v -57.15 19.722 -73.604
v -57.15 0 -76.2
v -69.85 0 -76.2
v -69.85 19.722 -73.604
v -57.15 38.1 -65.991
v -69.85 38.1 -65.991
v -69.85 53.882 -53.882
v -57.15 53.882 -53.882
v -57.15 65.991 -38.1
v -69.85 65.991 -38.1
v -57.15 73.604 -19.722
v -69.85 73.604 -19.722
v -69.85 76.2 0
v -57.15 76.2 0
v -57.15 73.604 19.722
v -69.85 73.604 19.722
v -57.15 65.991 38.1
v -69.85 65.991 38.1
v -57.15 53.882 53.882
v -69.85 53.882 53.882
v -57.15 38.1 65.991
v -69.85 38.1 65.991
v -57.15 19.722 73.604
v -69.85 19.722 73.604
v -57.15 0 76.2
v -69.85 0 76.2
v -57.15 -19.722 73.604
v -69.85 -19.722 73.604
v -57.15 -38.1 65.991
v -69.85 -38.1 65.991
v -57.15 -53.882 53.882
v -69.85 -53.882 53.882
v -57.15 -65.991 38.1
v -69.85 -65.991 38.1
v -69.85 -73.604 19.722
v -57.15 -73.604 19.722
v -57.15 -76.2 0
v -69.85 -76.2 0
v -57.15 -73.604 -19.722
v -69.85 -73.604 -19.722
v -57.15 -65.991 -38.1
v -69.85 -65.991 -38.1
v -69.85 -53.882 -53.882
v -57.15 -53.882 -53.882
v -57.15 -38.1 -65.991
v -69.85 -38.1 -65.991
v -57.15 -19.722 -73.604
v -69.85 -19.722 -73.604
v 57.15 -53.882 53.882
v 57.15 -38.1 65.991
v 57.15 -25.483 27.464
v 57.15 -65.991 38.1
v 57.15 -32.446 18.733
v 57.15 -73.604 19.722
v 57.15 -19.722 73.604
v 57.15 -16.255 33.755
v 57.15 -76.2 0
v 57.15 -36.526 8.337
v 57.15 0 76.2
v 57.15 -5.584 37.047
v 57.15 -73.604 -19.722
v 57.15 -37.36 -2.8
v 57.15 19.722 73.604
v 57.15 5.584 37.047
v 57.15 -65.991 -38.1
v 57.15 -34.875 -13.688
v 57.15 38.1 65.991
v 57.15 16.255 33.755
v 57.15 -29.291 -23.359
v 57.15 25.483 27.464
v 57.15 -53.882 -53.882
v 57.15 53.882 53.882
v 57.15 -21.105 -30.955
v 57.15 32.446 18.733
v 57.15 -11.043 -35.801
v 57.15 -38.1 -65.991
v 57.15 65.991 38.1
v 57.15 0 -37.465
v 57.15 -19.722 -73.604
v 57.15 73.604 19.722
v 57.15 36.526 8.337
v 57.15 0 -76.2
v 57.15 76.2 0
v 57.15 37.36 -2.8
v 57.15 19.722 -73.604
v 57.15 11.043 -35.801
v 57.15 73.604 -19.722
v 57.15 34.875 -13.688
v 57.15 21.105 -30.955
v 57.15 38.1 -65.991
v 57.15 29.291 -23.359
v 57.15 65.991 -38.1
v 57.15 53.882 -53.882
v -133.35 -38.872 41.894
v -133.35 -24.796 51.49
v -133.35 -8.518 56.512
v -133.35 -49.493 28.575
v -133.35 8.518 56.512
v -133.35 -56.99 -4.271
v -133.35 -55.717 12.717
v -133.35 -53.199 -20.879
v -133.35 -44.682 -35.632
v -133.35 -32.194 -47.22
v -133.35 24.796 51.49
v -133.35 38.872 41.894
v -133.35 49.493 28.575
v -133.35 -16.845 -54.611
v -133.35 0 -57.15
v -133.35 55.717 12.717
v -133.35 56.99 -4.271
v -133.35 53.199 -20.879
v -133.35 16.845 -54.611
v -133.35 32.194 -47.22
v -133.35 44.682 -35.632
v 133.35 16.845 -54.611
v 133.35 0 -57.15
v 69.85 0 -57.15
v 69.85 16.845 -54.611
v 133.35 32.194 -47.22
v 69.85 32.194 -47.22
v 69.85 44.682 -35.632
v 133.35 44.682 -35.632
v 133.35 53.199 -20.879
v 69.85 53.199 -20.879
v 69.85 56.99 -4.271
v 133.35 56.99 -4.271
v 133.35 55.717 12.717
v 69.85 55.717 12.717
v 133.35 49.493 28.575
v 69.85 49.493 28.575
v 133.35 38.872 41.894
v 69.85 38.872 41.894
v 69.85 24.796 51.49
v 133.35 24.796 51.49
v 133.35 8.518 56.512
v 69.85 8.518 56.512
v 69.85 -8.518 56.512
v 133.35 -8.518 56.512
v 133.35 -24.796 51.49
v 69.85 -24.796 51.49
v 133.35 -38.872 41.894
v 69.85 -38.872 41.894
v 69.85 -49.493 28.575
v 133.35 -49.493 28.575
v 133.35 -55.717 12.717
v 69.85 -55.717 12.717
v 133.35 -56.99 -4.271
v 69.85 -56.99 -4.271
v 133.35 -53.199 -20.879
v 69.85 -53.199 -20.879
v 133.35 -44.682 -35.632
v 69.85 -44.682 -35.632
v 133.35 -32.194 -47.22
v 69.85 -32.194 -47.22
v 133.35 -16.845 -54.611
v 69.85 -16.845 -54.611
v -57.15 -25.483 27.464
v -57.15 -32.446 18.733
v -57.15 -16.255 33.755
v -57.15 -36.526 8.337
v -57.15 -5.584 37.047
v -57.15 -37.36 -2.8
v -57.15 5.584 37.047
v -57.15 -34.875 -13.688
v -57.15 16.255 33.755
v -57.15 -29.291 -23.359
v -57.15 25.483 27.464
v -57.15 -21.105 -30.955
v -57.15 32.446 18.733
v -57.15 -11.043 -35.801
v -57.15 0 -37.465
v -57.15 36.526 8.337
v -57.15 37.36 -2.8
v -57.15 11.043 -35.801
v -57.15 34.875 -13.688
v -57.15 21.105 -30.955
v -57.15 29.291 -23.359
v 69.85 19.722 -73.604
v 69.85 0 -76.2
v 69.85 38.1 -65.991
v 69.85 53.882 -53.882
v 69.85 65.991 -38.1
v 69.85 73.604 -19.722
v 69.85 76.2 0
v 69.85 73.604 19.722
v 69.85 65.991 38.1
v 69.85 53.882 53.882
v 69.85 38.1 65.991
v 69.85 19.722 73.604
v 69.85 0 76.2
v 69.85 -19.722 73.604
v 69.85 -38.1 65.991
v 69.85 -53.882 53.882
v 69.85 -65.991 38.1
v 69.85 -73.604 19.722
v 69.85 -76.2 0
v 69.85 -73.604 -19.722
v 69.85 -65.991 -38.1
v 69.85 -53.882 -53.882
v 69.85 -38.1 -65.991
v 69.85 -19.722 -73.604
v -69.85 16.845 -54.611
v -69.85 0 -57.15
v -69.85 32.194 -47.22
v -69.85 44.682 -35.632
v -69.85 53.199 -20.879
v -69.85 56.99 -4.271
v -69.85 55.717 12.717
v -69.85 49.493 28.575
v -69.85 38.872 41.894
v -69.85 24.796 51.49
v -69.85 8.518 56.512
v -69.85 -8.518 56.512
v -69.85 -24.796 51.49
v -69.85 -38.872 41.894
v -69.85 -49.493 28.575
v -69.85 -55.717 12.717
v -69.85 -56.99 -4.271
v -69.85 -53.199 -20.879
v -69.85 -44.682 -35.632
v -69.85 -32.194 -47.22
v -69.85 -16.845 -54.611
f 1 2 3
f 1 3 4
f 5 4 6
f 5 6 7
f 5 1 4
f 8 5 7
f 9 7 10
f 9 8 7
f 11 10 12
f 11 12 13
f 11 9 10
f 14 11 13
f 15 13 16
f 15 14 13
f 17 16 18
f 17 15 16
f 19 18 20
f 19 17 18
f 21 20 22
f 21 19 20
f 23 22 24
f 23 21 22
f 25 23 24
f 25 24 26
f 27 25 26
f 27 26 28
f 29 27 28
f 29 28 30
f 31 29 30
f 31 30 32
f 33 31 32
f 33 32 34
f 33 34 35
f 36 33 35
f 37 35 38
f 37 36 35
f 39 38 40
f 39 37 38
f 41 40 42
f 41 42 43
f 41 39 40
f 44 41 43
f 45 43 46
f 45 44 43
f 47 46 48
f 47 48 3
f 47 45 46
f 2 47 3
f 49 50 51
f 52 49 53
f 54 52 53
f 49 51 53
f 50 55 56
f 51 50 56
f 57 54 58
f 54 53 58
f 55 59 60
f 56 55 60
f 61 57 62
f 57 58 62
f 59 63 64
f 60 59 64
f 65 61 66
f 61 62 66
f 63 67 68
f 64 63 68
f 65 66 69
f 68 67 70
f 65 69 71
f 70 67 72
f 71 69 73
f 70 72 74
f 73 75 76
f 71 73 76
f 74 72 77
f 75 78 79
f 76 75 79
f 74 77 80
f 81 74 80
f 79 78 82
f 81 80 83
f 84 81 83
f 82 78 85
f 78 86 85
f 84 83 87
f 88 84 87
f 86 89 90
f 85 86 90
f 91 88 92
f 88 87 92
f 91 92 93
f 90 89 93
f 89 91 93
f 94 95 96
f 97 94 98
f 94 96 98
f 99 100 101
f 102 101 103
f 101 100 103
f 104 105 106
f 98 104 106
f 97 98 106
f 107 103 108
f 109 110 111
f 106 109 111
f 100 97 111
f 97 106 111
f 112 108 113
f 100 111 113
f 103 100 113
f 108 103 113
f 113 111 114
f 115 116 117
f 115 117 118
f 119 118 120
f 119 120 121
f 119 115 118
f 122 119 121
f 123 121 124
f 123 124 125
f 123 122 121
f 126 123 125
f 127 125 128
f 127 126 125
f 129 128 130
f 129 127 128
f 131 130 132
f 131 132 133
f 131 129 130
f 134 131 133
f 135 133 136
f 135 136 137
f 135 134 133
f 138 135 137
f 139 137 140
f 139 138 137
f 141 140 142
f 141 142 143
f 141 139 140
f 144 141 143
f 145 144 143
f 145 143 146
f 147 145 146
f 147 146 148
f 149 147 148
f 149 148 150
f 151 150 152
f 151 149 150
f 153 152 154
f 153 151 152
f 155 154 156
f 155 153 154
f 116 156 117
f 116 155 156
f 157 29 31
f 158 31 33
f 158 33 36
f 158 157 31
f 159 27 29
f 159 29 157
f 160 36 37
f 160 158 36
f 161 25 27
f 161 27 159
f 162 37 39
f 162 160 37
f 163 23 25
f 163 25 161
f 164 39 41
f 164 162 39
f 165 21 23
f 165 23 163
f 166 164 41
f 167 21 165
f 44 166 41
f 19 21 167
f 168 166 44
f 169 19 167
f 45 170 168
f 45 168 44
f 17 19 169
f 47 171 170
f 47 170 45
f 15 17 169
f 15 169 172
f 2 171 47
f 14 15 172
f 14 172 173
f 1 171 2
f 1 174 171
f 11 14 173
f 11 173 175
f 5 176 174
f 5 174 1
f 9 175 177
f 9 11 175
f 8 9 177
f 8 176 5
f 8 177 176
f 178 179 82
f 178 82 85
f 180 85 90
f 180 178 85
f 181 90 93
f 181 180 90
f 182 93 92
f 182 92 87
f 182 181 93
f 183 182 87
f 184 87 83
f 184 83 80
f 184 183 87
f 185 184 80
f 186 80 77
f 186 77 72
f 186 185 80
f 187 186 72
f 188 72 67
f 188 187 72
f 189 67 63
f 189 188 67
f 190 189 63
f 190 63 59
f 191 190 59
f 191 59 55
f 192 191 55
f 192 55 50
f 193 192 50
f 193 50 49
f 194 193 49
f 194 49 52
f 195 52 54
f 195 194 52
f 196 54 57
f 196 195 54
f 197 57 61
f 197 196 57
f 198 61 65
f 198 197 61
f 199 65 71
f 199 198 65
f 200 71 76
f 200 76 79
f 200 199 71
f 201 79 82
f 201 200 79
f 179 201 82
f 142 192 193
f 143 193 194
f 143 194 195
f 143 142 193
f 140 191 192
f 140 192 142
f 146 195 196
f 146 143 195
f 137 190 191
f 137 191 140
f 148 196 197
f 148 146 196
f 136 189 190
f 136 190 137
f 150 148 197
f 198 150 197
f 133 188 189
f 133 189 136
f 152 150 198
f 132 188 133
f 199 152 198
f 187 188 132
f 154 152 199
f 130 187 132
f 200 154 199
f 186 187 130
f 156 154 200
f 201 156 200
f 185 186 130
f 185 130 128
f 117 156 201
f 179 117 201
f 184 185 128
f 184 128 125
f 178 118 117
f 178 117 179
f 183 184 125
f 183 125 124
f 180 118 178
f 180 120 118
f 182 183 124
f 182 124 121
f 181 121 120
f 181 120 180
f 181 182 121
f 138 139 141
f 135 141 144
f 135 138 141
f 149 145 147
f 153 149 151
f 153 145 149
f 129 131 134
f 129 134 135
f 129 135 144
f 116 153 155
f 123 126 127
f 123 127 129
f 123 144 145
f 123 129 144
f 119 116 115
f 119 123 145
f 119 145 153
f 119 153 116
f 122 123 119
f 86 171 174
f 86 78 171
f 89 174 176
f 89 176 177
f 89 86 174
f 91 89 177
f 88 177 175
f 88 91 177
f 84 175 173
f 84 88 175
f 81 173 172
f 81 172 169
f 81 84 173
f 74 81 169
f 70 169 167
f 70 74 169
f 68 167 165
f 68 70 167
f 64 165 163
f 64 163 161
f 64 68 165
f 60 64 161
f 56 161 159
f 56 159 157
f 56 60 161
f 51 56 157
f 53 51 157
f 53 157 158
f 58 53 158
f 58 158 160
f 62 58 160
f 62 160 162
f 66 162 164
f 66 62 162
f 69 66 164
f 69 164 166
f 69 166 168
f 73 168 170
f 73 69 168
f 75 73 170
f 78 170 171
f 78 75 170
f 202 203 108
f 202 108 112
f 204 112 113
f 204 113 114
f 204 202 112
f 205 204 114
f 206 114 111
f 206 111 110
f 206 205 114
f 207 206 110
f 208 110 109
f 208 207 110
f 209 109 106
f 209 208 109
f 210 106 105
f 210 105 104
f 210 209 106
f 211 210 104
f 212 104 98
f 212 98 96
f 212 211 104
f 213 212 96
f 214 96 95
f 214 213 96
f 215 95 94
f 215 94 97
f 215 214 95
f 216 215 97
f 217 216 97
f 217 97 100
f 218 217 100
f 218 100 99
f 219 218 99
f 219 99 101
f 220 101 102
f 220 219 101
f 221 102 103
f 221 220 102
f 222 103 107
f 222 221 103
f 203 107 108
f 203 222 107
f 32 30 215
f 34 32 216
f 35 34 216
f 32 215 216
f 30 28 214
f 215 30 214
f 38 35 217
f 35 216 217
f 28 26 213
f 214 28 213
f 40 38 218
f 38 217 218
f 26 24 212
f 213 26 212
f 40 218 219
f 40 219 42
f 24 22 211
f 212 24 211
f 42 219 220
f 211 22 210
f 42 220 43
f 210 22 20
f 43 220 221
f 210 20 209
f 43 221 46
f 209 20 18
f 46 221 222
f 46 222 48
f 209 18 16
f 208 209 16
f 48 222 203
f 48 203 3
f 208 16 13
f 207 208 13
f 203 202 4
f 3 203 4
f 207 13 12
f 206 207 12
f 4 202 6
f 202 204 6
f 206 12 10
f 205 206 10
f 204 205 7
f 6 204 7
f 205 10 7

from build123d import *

# Parameters (mm, degrees)
SKETCH1_R           = 37.465
BOSS_EXTRUDE1_DEPTH = 57.15
BOSS_EXTRUDE2_START = 69.85
SKETCH1_3_R         = 76.2
SKETCH1_3_R_2       = 57.15
SKETCH1_3_R_3       = 37.465
BOSS_EXTRUDE2_DEPTH = 12.7
BOSS_EXTRUDE3_START = 133.35
SKETCH1_4_R         = 57.15
SKETCH1_4_R_2       = 37.465
BOSS_EXTRUDE3_DEPTH = 63.5
BOSS_EXTRUDE4_START = -57.15
SKETCH1_5_R         = 76.2
SKETCH1_5_R_2       = 57.15
SKETCH1_5_R_3       = 37.465
BOSS_EXTRUDE4_DEPTH = 12.7
BOSS_EXTRUDE5_START = -69.85
SKETCH1_6_R         = 57.15
SKETCH1_6_R_2       = 37.465
BOSS_EXTRUDE5_DEPTH = 63.5


with BuildPart() as part:
    # Sketch1 → Boss-Extrude1 (new, symmetric)
    with BuildSketch(Plane(origin=(0, 0, 0), x_dir=(0, 0, -1), z_dir=(1, 0, 0))):
        Circle(SKETCH1_R)
    extrude(amount=BOSS_EXTRUDE1_DEPTH, both=True)

    # Sketch1<3> → Boss-Extrude2 (add)
    # profile 1 of 3: a face of its own
    with BuildSketch(Plane(origin=(0, 0, 0), x_dir=(0, 0, -1), z_dir=(1, 0, 0)).offset(BOSS_EXTRUDE2_START)):
        Circle(SKETCH1_3_R)
        Circle(SKETCH1_3_R_2, mode=Mode.SUBTRACT)
    # profile 2 of 3: a face of its own
    with BuildSketch(Plane(origin=(0, 0, 0), x_dir=(0, 0, -1), z_dir=(1, 0, 0)).offset(BOSS_EXTRUDE2_START)):
        Circle(SKETCH1_3_R_2)
        Circle(SKETCH1_3_R_3, mode=Mode.SUBTRACT)
    # profile 3 of 3: a face of its own
    with BuildSketch(Plane(origin=(0, 0, 0), x_dir=(0, 0, -1), z_dir=(1, 0, 0)).offset(BOSS_EXTRUDE2_START)):
        Circle(SKETCH1_3_R_3)
    extrude(amount=-BOSS_EXTRUDE2_DEPTH)

    # Sketch1<4> → Boss-Extrude3 (add)
    # profile 1 of 2: a face of its own
    with BuildSketch(Plane(origin=(0, 0, 0), x_dir=(0, 0, -1), z_dir=(1, 0, 0)).offset(BOSS_EXTRUDE3_START)):
        Circle(SKETCH1_4_R)
        Circle(SKETCH1_4_R_2, mode=Mode.SUBTRACT)
    # profile 2 of 2: a face of its own
    with BuildSketch(Plane(origin=(0, 0, 0), x_dir=(0, 0, -1), z_dir=(1, 0, 0)).offset(BOSS_EXTRUDE3_START)):
        Circle(SKETCH1_4_R_2)
    extrude(amount=-BOSS_EXTRUDE3_DEPTH)

    # Sketch1<5> → Boss-Extrude4 (add)
    # profile 1 of 3: a face of its own
    with BuildSketch(Plane(origin=(0, 0, 0), x_dir=(0, 0, -1), z_dir=(1, 0, 0)).offset(BOSS_EXTRUDE4_START)):
        Circle(SKETCH1_5_R)
        Circle(SKETCH1_5_R_2, mode=Mode.SUBTRACT)
    # profile 2 of 3: a face of its own
    with BuildSketch(Plane(origin=(0, 0, 0), x_dir=(0, 0, -1), z_dir=(1, 0, 0)).offset(BOSS_EXTRUDE4_START)):
        Circle(SKETCH1_5_R_2)
        Circle(SKETCH1_5_R_3, mode=Mode.SUBTRACT)
    # profile 3 of 3: a face of its own
    with BuildSketch(Plane(origin=(0, 0, 0), x_dir=(0, 0, -1), z_dir=(1, 0, 0)).offset(BOSS_EXTRUDE4_START)):
        Circle(SKETCH1_5_R_3)
    extrude(amount=-BOSS_EXTRUDE4_DEPTH)

    # Sketch1<6> → Boss-Extrude5 (add)
    # profile 1 of 2: a face of its own
    with BuildSketch(Plane(origin=(0, 0, 0), x_dir=(0, 0, -1), z_dir=(1, 0, 0)).offset(BOSS_EXTRUDE5_START)):
        Circle(SKETCH1_6_R)
        Circle(SKETCH1_6_R_2, mode=Mode.SUBTRACT)
    # profile 2 of 2: a face of its own
    with BuildSketch(Plane(origin=(0, 0, 0), x_dir=(0, 0, -1), z_dir=(1, 0, 0)).offset(BOSS_EXTRUDE5_START)):
        Circle(SKETCH1_6_R_2)
    extrude(amount=-BOSS_EXTRUDE5_DEPTH)


solid = part.part
